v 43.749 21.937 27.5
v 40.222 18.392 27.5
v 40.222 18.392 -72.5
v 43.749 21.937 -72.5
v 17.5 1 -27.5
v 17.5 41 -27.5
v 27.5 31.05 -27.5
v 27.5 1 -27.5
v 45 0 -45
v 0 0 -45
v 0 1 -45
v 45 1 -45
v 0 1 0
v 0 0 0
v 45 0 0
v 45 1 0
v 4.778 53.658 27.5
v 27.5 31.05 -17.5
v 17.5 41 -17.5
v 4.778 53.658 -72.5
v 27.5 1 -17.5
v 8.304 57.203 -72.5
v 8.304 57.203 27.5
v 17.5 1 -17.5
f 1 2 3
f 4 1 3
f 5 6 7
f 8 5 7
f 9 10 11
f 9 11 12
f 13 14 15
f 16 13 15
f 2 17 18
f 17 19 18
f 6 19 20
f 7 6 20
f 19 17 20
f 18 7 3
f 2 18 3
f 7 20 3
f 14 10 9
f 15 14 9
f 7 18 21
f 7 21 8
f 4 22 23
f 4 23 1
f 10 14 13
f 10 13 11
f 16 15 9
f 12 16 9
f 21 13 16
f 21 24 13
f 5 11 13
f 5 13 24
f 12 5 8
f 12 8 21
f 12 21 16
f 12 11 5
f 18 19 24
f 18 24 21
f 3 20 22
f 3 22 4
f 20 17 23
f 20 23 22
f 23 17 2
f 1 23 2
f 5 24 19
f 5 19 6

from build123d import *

# Parameters (mm, degrees)
SKETCH2_W            = 45
SKETCH2_H            = 45
BOSS_EXTRUDE1_DEPTH  = 1
SKETCH4_W            = 10
SKETCH4_H            = 10
BOSS_EXTRUDE3_DEPTH  = 40
CUT_EXTRUDE4_DEPTH   = 30
SKETCH19_W           = 50
SKETCH19_H           = 100
BOSS_EXTRUDE10_DEPTH = 5


with BuildPart() as part:
    # Sketch2 → Boss-Extrude1 (new body)
    with BuildSketch(Plane(origin=(0, 0, 0), x_dir=(1, 0, 0), z_dir=(0, 1, 0))):
        with Locations((22.5, 22.5)):
            Rectangle(SKETCH2_W, SKETCH2_H)
    extrude(amount=BOSS_EXTRUDE1_DEPTH)

    # Sketch4 → Boss-Extrude3 (add)
    with BuildSketch(Plane(origin=(0, 1, 0), x_dir=(1, 0, 0), z_dir=(0, 1, 0))):
        with Locations((22.5, 22.5)):
            Rectangle(SKETCH4_W, SKETCH4_H)
    extrude(amount=BOSS_EXTRUDE3_DEPTH)

    # Sketch10 → Cut-Extrude4 (cut)
    with BuildSketch(Plane(origin=(17.5, 41, -17.5), x_dir=(1, 0, 0), z_dir=(0, 0, 1))):
        Polygon((0, 0), (10, -9.949648776), (17.910752022, -1.998863577), (8.35816631, 7.505623697), align=None)
    extrude(amount=-CUT_EXTRUDE4_DEPTH, mode=Mode.SUBTRACT)

    # Sketch19 → Boss-Extrude10 (add)
    with BuildSketch(Plane(origin=(29.205570589, 29.353368392, 0), x_dir=(0.708889201, -0.705319857, 0), z_dir=(0.705319857, 0.708889201, 0))):
        with Locations((-9.459264691, 22.5)):
            Rectangle(SKETCH19_W, SKETCH19_H)
    extrude(amount=BOSS_EXTRUDE10_DEPTH)


solid = part.part
